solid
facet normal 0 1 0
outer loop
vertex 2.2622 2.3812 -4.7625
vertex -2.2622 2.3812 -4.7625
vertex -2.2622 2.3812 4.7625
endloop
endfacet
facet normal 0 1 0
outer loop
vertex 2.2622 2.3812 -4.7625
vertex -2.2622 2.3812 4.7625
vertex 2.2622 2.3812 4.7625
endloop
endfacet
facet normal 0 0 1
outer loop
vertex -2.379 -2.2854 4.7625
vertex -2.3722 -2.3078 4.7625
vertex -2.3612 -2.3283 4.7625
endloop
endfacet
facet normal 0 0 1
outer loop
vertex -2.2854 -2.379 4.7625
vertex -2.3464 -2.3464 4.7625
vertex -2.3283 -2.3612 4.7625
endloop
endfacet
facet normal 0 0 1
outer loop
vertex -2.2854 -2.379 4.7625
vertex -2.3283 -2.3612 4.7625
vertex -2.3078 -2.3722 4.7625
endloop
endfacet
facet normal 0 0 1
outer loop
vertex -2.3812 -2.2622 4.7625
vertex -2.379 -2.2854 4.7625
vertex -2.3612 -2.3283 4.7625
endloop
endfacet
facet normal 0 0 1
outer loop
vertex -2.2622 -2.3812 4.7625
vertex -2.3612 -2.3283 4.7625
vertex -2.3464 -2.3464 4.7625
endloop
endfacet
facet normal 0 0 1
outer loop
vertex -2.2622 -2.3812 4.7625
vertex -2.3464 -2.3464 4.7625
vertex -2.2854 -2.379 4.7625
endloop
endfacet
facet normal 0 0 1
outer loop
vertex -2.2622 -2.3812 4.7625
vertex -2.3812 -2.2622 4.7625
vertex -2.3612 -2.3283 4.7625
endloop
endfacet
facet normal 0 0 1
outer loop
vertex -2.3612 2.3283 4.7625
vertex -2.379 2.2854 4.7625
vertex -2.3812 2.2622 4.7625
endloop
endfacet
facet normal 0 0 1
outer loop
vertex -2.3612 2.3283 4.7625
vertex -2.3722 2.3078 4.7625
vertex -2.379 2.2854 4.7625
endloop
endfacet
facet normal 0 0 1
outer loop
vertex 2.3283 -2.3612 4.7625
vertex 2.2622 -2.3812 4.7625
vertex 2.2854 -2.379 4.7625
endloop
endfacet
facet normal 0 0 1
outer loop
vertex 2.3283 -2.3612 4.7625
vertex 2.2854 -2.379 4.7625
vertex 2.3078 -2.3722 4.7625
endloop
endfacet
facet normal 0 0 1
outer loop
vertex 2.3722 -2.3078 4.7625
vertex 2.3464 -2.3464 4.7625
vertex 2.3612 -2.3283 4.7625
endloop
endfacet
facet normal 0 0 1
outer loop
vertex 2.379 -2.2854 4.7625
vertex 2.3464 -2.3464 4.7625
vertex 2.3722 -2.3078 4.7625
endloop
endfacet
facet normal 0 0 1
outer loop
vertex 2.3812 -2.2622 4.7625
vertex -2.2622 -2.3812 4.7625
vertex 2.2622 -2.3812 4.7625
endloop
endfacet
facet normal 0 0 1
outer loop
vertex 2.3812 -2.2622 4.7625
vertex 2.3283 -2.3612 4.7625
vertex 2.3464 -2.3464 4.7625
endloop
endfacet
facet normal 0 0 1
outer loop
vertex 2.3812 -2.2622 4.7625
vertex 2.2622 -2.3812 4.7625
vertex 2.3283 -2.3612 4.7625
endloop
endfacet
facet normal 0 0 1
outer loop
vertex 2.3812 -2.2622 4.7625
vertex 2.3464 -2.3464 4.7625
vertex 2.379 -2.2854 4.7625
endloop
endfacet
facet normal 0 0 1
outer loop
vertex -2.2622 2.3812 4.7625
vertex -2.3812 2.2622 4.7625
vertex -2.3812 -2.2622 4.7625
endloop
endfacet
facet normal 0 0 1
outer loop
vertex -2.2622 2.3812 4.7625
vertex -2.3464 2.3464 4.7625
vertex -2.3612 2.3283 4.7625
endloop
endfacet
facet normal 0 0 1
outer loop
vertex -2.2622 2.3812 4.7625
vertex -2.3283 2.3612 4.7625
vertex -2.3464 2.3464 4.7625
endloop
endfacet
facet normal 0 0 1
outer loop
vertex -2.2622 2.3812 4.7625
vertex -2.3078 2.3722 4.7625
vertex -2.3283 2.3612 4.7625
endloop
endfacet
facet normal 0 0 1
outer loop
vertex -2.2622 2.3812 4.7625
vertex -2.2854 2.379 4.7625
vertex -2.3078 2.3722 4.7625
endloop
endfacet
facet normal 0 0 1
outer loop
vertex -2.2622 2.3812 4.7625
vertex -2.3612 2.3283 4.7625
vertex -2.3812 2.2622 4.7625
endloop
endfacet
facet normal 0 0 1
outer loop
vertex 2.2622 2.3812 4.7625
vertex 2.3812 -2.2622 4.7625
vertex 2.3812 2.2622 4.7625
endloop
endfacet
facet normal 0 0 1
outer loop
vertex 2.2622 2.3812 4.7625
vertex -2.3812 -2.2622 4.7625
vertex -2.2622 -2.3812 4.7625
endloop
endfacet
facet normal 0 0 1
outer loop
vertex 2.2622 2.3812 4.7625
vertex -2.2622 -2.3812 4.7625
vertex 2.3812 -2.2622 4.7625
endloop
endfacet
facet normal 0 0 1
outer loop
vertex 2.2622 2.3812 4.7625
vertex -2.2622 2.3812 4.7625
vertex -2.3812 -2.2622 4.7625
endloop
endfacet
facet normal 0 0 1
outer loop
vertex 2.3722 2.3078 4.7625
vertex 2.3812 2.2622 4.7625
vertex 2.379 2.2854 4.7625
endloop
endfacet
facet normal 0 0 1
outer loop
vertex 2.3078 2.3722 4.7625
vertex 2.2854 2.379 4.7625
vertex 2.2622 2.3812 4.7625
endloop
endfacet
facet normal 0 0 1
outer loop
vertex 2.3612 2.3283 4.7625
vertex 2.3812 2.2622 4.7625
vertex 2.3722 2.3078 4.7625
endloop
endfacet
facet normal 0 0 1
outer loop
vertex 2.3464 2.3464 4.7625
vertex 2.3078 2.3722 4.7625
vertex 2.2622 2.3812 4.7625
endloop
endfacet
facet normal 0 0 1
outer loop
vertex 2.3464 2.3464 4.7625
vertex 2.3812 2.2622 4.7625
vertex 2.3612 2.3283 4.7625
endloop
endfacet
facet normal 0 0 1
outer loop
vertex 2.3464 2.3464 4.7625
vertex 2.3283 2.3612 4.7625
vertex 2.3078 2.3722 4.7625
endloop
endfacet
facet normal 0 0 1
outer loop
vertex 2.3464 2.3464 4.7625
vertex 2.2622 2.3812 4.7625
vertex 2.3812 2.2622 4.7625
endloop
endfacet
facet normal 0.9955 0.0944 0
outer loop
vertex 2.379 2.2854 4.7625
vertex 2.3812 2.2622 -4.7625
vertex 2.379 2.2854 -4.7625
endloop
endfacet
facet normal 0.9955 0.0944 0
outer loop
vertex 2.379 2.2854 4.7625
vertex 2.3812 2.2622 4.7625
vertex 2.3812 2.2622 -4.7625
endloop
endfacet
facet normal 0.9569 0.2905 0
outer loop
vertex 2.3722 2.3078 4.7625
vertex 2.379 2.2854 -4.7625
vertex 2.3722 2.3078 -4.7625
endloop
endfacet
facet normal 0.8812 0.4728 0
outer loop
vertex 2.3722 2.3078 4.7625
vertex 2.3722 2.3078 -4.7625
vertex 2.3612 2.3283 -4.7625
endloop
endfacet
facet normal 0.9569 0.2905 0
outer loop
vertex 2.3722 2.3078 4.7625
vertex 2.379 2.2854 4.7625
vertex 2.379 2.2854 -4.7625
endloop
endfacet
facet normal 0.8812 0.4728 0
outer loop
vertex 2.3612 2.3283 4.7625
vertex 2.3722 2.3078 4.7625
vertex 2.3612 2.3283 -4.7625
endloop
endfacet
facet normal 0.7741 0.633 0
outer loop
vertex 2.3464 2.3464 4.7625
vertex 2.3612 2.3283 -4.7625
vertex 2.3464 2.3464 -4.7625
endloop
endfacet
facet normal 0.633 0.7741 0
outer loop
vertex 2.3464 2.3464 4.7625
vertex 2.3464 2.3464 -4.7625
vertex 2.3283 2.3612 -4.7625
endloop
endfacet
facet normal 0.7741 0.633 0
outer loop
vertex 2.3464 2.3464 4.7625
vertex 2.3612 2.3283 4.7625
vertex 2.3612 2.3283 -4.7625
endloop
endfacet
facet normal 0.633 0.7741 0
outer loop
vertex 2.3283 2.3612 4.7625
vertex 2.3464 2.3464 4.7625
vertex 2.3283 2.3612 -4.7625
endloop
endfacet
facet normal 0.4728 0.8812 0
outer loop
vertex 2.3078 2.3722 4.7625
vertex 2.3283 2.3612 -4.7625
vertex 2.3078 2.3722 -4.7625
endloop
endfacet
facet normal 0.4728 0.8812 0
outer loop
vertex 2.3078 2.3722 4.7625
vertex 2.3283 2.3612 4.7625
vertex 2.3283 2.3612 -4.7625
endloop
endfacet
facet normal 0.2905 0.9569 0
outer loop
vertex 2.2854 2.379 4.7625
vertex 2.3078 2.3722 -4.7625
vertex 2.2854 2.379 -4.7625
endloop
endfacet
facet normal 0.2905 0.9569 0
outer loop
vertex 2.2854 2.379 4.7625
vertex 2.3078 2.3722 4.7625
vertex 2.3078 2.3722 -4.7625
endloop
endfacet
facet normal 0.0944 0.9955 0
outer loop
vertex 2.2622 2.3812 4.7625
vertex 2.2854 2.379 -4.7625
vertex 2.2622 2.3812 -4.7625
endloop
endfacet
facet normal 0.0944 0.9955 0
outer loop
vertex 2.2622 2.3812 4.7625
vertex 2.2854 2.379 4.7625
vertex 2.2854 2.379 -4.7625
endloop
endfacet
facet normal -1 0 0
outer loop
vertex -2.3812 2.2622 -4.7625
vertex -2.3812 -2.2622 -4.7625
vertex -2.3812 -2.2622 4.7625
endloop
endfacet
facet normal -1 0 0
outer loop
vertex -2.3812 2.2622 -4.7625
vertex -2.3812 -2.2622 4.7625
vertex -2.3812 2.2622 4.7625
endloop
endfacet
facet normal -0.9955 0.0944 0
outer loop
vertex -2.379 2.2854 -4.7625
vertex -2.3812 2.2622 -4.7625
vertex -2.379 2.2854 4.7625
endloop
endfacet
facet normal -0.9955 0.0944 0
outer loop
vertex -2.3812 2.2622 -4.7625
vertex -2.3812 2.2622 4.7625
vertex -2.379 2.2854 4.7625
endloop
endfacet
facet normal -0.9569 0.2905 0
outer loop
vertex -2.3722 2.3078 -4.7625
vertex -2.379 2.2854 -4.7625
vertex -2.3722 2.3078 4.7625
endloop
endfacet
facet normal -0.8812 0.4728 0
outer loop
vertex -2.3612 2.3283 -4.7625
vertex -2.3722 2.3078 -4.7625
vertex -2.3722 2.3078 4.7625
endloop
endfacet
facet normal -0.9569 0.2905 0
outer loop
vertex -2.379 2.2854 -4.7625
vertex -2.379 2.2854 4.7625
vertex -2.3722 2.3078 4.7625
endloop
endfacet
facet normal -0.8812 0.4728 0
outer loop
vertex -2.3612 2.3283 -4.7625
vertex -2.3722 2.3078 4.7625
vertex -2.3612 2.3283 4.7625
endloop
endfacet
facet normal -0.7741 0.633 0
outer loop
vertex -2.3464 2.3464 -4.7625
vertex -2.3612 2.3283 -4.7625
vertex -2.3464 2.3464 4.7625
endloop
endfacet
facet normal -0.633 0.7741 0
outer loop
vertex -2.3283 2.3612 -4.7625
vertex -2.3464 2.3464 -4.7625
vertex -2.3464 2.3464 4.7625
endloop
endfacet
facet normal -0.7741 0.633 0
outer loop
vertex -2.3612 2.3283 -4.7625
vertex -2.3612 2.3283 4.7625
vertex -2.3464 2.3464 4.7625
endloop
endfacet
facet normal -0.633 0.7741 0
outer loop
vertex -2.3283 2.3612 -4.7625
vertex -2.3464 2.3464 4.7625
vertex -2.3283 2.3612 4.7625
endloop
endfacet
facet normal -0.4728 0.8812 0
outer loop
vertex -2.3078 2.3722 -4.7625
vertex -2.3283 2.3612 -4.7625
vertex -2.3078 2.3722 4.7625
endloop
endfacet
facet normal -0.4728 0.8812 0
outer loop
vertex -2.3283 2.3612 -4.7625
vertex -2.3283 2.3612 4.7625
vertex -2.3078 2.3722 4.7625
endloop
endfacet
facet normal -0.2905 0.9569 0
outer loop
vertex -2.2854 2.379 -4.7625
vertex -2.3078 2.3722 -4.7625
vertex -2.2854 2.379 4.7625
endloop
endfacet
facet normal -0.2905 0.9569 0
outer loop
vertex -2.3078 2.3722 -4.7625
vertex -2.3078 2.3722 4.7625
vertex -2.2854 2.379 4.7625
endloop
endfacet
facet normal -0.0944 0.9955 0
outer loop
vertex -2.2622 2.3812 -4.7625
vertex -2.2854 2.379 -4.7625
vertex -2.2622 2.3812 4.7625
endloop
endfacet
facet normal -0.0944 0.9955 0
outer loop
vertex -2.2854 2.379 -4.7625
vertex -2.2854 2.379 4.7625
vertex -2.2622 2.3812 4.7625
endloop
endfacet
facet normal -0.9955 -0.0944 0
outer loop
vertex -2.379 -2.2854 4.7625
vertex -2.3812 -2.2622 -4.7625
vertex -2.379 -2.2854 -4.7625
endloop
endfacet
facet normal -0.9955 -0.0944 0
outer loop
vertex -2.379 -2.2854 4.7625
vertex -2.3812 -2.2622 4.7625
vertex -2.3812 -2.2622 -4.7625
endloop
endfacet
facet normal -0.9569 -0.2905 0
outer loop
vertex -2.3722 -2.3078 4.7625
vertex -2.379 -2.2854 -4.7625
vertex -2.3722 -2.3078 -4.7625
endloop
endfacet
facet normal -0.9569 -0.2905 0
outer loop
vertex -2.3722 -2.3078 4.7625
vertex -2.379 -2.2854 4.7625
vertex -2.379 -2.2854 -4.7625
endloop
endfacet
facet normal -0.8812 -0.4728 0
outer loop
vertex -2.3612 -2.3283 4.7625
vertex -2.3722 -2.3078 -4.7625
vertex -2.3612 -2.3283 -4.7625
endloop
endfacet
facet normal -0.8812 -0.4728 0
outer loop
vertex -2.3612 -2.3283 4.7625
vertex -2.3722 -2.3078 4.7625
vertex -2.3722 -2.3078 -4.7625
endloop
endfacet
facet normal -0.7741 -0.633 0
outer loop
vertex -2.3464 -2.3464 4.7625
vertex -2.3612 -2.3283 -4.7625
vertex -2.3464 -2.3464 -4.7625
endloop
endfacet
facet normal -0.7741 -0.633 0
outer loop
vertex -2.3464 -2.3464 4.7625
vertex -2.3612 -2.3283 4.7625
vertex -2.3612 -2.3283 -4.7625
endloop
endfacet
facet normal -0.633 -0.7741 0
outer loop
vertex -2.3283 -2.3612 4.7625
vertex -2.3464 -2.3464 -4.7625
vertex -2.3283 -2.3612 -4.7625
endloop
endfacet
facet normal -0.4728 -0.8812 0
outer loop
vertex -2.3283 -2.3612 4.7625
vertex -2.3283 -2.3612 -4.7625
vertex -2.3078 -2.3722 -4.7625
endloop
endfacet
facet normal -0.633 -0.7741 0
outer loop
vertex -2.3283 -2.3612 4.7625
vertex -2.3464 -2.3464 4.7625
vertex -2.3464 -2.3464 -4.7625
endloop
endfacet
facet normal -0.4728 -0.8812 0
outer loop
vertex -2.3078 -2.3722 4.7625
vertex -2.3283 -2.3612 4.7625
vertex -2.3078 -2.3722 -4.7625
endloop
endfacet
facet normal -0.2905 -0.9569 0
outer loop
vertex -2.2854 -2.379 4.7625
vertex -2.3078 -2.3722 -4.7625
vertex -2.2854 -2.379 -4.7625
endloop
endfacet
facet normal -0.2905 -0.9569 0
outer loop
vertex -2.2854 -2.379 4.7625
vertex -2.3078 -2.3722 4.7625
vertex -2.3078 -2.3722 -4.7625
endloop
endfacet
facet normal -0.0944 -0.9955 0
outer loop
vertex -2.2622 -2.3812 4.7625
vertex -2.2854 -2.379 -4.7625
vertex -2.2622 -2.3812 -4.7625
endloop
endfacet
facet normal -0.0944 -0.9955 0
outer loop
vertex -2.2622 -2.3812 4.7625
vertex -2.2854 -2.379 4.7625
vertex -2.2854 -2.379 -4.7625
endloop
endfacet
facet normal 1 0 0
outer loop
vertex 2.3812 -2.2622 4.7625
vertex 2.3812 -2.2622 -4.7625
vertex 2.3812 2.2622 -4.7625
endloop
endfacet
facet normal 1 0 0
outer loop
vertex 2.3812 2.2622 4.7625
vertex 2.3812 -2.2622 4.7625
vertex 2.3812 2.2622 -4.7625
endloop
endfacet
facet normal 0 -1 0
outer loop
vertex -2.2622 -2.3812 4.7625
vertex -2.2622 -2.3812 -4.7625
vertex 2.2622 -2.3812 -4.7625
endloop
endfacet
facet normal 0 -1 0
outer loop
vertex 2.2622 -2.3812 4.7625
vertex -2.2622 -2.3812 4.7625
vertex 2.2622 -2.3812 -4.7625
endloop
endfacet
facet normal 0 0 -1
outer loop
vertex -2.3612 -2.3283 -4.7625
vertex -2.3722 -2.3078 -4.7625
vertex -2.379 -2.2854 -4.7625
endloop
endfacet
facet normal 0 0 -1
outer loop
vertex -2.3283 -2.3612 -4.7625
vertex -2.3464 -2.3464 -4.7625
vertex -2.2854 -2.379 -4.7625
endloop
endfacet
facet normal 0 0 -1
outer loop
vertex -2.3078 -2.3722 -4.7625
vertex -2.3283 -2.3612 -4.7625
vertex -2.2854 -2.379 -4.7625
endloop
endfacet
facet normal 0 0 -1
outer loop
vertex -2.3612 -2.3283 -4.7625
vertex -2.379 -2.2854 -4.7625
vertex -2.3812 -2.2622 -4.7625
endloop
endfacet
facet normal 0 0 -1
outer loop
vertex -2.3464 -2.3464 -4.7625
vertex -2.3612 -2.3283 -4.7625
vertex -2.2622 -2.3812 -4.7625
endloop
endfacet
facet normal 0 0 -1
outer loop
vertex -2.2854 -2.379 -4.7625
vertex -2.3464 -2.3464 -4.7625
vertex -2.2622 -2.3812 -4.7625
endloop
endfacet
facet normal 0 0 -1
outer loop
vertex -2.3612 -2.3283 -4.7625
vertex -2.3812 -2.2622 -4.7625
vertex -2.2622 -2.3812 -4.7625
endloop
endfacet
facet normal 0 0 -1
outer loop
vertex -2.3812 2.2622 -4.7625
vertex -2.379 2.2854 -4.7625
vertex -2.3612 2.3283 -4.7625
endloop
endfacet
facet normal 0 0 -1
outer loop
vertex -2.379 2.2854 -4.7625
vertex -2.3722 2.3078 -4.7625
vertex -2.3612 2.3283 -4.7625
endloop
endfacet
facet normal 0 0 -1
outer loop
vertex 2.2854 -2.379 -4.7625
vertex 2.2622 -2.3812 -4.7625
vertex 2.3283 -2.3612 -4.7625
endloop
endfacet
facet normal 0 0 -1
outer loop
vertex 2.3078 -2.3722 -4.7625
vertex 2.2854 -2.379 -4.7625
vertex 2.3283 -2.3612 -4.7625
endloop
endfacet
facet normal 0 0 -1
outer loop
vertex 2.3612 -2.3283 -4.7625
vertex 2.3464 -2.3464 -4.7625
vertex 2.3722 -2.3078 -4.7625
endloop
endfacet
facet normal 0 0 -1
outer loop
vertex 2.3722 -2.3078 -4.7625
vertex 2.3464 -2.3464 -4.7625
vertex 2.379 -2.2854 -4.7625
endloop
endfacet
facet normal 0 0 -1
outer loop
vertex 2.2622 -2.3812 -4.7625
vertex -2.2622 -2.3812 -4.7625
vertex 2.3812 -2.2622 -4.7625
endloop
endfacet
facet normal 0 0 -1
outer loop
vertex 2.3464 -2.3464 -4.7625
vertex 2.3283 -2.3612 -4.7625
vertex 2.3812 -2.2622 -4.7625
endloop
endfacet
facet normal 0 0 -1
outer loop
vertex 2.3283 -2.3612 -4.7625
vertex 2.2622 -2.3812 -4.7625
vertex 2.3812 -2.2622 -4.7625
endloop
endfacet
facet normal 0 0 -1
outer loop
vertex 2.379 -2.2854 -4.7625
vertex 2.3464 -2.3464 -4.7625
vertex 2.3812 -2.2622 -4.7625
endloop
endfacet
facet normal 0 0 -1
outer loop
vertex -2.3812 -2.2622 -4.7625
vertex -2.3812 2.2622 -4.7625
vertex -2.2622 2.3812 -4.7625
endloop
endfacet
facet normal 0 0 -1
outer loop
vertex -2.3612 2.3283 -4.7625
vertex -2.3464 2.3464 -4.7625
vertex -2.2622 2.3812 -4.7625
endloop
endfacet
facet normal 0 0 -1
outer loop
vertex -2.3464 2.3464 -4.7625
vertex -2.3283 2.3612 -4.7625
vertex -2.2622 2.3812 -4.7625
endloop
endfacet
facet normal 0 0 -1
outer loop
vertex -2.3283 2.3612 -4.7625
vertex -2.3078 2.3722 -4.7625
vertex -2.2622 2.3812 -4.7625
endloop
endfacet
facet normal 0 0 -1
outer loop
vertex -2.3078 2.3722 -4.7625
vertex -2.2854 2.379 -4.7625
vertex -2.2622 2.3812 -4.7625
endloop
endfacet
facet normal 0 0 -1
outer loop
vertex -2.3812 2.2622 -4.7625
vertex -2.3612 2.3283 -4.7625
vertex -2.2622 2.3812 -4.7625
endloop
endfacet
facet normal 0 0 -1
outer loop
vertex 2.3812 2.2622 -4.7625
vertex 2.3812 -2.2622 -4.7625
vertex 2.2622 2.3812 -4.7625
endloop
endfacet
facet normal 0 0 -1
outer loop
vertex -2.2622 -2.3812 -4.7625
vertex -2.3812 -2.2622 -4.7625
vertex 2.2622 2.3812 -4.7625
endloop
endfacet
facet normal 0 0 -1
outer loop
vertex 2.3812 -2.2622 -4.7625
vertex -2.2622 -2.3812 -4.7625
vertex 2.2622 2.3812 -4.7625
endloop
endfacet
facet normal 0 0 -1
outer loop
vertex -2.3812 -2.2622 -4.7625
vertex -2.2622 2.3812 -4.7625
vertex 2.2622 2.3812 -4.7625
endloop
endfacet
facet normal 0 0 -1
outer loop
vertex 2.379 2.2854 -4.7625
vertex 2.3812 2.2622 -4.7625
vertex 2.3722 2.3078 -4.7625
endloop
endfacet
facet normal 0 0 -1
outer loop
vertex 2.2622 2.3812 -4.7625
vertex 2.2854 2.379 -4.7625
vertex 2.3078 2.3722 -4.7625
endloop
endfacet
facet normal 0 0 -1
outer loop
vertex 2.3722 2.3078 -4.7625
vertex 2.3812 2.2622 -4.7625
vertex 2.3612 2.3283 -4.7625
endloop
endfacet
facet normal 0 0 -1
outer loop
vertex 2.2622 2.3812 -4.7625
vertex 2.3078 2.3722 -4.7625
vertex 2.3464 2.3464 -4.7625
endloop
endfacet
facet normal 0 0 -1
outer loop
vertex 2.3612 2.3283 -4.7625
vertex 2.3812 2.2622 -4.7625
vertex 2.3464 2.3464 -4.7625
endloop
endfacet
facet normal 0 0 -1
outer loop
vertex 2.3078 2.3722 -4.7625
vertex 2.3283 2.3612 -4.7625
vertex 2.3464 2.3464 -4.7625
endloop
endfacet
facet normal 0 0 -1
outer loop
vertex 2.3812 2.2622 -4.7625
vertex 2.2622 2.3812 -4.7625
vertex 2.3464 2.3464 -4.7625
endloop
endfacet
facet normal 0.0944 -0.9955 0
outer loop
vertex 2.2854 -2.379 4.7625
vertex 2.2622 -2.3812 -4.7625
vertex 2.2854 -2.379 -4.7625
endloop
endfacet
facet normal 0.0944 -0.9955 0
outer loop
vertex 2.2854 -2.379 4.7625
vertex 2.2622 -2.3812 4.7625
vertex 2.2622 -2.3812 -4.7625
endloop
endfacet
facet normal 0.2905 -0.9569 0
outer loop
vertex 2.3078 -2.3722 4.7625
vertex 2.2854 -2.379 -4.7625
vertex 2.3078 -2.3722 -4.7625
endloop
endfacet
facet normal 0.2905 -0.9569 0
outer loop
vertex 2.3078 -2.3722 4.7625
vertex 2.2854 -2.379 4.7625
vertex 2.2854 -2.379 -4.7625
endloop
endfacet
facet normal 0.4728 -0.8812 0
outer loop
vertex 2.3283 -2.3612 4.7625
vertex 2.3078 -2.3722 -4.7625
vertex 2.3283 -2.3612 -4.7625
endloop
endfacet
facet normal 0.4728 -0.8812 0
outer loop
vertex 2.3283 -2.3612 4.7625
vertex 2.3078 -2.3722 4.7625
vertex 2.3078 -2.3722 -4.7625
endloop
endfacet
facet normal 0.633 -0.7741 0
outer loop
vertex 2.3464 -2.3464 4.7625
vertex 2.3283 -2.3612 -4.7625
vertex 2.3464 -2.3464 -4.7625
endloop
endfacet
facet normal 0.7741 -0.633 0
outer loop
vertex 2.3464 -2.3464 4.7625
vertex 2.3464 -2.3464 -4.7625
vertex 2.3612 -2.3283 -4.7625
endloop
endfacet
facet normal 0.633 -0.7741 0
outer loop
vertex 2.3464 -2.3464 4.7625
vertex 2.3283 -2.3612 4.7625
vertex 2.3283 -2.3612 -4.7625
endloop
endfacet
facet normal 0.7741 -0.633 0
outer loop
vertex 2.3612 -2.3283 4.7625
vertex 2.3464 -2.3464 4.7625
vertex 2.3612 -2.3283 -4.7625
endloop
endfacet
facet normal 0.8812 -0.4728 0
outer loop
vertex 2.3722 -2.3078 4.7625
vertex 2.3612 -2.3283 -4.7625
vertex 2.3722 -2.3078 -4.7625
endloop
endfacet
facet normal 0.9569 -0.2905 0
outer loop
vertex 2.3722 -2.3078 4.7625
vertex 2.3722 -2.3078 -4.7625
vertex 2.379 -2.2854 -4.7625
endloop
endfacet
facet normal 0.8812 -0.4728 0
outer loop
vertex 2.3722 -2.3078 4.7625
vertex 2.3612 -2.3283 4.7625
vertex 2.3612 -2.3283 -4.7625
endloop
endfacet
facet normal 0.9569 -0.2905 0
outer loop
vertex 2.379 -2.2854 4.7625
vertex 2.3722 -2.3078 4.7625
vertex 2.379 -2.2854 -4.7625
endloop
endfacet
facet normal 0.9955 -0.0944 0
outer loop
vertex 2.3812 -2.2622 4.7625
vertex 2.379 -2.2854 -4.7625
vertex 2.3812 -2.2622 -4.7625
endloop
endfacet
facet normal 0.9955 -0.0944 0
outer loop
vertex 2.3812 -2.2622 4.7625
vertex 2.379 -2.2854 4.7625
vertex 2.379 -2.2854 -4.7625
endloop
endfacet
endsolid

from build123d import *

# Parameters (mm, degrees)
BOSS_EXTRUDE1_START = -4.7625
SKETCH3_W           = 4.7625
SKETCH3_H           = 4.7625
BOSS_EXTRUDE1_DEPTH = 9.525
FILLET1_R           = 0.1190625


with BuildPart() as part:
    # Sketch3 → Boss-Extrude1 (new body)
    with BuildSketch(Plane.XY.offset(BOSS_EXTRUDE1_START)):
        Rectangle(SKETCH3_W, SKETCH3_H)
    extrude(amount=BOSS_EXTRUDE1_DEPTH)

    # Fillet1
    fillet1_edges = [part.edges().sort_by_distance(p)[0] for p in [
        (-2.38125, 2.38125, 0),
        (2.38125, 2.38125, 0),
        (2.38125, -2.38125, 0),
        (-2.38125, -2.38125, 0),
    ]]
    fillet(fillet1_edges, radius=FILLET1_R)


solid = part.part
